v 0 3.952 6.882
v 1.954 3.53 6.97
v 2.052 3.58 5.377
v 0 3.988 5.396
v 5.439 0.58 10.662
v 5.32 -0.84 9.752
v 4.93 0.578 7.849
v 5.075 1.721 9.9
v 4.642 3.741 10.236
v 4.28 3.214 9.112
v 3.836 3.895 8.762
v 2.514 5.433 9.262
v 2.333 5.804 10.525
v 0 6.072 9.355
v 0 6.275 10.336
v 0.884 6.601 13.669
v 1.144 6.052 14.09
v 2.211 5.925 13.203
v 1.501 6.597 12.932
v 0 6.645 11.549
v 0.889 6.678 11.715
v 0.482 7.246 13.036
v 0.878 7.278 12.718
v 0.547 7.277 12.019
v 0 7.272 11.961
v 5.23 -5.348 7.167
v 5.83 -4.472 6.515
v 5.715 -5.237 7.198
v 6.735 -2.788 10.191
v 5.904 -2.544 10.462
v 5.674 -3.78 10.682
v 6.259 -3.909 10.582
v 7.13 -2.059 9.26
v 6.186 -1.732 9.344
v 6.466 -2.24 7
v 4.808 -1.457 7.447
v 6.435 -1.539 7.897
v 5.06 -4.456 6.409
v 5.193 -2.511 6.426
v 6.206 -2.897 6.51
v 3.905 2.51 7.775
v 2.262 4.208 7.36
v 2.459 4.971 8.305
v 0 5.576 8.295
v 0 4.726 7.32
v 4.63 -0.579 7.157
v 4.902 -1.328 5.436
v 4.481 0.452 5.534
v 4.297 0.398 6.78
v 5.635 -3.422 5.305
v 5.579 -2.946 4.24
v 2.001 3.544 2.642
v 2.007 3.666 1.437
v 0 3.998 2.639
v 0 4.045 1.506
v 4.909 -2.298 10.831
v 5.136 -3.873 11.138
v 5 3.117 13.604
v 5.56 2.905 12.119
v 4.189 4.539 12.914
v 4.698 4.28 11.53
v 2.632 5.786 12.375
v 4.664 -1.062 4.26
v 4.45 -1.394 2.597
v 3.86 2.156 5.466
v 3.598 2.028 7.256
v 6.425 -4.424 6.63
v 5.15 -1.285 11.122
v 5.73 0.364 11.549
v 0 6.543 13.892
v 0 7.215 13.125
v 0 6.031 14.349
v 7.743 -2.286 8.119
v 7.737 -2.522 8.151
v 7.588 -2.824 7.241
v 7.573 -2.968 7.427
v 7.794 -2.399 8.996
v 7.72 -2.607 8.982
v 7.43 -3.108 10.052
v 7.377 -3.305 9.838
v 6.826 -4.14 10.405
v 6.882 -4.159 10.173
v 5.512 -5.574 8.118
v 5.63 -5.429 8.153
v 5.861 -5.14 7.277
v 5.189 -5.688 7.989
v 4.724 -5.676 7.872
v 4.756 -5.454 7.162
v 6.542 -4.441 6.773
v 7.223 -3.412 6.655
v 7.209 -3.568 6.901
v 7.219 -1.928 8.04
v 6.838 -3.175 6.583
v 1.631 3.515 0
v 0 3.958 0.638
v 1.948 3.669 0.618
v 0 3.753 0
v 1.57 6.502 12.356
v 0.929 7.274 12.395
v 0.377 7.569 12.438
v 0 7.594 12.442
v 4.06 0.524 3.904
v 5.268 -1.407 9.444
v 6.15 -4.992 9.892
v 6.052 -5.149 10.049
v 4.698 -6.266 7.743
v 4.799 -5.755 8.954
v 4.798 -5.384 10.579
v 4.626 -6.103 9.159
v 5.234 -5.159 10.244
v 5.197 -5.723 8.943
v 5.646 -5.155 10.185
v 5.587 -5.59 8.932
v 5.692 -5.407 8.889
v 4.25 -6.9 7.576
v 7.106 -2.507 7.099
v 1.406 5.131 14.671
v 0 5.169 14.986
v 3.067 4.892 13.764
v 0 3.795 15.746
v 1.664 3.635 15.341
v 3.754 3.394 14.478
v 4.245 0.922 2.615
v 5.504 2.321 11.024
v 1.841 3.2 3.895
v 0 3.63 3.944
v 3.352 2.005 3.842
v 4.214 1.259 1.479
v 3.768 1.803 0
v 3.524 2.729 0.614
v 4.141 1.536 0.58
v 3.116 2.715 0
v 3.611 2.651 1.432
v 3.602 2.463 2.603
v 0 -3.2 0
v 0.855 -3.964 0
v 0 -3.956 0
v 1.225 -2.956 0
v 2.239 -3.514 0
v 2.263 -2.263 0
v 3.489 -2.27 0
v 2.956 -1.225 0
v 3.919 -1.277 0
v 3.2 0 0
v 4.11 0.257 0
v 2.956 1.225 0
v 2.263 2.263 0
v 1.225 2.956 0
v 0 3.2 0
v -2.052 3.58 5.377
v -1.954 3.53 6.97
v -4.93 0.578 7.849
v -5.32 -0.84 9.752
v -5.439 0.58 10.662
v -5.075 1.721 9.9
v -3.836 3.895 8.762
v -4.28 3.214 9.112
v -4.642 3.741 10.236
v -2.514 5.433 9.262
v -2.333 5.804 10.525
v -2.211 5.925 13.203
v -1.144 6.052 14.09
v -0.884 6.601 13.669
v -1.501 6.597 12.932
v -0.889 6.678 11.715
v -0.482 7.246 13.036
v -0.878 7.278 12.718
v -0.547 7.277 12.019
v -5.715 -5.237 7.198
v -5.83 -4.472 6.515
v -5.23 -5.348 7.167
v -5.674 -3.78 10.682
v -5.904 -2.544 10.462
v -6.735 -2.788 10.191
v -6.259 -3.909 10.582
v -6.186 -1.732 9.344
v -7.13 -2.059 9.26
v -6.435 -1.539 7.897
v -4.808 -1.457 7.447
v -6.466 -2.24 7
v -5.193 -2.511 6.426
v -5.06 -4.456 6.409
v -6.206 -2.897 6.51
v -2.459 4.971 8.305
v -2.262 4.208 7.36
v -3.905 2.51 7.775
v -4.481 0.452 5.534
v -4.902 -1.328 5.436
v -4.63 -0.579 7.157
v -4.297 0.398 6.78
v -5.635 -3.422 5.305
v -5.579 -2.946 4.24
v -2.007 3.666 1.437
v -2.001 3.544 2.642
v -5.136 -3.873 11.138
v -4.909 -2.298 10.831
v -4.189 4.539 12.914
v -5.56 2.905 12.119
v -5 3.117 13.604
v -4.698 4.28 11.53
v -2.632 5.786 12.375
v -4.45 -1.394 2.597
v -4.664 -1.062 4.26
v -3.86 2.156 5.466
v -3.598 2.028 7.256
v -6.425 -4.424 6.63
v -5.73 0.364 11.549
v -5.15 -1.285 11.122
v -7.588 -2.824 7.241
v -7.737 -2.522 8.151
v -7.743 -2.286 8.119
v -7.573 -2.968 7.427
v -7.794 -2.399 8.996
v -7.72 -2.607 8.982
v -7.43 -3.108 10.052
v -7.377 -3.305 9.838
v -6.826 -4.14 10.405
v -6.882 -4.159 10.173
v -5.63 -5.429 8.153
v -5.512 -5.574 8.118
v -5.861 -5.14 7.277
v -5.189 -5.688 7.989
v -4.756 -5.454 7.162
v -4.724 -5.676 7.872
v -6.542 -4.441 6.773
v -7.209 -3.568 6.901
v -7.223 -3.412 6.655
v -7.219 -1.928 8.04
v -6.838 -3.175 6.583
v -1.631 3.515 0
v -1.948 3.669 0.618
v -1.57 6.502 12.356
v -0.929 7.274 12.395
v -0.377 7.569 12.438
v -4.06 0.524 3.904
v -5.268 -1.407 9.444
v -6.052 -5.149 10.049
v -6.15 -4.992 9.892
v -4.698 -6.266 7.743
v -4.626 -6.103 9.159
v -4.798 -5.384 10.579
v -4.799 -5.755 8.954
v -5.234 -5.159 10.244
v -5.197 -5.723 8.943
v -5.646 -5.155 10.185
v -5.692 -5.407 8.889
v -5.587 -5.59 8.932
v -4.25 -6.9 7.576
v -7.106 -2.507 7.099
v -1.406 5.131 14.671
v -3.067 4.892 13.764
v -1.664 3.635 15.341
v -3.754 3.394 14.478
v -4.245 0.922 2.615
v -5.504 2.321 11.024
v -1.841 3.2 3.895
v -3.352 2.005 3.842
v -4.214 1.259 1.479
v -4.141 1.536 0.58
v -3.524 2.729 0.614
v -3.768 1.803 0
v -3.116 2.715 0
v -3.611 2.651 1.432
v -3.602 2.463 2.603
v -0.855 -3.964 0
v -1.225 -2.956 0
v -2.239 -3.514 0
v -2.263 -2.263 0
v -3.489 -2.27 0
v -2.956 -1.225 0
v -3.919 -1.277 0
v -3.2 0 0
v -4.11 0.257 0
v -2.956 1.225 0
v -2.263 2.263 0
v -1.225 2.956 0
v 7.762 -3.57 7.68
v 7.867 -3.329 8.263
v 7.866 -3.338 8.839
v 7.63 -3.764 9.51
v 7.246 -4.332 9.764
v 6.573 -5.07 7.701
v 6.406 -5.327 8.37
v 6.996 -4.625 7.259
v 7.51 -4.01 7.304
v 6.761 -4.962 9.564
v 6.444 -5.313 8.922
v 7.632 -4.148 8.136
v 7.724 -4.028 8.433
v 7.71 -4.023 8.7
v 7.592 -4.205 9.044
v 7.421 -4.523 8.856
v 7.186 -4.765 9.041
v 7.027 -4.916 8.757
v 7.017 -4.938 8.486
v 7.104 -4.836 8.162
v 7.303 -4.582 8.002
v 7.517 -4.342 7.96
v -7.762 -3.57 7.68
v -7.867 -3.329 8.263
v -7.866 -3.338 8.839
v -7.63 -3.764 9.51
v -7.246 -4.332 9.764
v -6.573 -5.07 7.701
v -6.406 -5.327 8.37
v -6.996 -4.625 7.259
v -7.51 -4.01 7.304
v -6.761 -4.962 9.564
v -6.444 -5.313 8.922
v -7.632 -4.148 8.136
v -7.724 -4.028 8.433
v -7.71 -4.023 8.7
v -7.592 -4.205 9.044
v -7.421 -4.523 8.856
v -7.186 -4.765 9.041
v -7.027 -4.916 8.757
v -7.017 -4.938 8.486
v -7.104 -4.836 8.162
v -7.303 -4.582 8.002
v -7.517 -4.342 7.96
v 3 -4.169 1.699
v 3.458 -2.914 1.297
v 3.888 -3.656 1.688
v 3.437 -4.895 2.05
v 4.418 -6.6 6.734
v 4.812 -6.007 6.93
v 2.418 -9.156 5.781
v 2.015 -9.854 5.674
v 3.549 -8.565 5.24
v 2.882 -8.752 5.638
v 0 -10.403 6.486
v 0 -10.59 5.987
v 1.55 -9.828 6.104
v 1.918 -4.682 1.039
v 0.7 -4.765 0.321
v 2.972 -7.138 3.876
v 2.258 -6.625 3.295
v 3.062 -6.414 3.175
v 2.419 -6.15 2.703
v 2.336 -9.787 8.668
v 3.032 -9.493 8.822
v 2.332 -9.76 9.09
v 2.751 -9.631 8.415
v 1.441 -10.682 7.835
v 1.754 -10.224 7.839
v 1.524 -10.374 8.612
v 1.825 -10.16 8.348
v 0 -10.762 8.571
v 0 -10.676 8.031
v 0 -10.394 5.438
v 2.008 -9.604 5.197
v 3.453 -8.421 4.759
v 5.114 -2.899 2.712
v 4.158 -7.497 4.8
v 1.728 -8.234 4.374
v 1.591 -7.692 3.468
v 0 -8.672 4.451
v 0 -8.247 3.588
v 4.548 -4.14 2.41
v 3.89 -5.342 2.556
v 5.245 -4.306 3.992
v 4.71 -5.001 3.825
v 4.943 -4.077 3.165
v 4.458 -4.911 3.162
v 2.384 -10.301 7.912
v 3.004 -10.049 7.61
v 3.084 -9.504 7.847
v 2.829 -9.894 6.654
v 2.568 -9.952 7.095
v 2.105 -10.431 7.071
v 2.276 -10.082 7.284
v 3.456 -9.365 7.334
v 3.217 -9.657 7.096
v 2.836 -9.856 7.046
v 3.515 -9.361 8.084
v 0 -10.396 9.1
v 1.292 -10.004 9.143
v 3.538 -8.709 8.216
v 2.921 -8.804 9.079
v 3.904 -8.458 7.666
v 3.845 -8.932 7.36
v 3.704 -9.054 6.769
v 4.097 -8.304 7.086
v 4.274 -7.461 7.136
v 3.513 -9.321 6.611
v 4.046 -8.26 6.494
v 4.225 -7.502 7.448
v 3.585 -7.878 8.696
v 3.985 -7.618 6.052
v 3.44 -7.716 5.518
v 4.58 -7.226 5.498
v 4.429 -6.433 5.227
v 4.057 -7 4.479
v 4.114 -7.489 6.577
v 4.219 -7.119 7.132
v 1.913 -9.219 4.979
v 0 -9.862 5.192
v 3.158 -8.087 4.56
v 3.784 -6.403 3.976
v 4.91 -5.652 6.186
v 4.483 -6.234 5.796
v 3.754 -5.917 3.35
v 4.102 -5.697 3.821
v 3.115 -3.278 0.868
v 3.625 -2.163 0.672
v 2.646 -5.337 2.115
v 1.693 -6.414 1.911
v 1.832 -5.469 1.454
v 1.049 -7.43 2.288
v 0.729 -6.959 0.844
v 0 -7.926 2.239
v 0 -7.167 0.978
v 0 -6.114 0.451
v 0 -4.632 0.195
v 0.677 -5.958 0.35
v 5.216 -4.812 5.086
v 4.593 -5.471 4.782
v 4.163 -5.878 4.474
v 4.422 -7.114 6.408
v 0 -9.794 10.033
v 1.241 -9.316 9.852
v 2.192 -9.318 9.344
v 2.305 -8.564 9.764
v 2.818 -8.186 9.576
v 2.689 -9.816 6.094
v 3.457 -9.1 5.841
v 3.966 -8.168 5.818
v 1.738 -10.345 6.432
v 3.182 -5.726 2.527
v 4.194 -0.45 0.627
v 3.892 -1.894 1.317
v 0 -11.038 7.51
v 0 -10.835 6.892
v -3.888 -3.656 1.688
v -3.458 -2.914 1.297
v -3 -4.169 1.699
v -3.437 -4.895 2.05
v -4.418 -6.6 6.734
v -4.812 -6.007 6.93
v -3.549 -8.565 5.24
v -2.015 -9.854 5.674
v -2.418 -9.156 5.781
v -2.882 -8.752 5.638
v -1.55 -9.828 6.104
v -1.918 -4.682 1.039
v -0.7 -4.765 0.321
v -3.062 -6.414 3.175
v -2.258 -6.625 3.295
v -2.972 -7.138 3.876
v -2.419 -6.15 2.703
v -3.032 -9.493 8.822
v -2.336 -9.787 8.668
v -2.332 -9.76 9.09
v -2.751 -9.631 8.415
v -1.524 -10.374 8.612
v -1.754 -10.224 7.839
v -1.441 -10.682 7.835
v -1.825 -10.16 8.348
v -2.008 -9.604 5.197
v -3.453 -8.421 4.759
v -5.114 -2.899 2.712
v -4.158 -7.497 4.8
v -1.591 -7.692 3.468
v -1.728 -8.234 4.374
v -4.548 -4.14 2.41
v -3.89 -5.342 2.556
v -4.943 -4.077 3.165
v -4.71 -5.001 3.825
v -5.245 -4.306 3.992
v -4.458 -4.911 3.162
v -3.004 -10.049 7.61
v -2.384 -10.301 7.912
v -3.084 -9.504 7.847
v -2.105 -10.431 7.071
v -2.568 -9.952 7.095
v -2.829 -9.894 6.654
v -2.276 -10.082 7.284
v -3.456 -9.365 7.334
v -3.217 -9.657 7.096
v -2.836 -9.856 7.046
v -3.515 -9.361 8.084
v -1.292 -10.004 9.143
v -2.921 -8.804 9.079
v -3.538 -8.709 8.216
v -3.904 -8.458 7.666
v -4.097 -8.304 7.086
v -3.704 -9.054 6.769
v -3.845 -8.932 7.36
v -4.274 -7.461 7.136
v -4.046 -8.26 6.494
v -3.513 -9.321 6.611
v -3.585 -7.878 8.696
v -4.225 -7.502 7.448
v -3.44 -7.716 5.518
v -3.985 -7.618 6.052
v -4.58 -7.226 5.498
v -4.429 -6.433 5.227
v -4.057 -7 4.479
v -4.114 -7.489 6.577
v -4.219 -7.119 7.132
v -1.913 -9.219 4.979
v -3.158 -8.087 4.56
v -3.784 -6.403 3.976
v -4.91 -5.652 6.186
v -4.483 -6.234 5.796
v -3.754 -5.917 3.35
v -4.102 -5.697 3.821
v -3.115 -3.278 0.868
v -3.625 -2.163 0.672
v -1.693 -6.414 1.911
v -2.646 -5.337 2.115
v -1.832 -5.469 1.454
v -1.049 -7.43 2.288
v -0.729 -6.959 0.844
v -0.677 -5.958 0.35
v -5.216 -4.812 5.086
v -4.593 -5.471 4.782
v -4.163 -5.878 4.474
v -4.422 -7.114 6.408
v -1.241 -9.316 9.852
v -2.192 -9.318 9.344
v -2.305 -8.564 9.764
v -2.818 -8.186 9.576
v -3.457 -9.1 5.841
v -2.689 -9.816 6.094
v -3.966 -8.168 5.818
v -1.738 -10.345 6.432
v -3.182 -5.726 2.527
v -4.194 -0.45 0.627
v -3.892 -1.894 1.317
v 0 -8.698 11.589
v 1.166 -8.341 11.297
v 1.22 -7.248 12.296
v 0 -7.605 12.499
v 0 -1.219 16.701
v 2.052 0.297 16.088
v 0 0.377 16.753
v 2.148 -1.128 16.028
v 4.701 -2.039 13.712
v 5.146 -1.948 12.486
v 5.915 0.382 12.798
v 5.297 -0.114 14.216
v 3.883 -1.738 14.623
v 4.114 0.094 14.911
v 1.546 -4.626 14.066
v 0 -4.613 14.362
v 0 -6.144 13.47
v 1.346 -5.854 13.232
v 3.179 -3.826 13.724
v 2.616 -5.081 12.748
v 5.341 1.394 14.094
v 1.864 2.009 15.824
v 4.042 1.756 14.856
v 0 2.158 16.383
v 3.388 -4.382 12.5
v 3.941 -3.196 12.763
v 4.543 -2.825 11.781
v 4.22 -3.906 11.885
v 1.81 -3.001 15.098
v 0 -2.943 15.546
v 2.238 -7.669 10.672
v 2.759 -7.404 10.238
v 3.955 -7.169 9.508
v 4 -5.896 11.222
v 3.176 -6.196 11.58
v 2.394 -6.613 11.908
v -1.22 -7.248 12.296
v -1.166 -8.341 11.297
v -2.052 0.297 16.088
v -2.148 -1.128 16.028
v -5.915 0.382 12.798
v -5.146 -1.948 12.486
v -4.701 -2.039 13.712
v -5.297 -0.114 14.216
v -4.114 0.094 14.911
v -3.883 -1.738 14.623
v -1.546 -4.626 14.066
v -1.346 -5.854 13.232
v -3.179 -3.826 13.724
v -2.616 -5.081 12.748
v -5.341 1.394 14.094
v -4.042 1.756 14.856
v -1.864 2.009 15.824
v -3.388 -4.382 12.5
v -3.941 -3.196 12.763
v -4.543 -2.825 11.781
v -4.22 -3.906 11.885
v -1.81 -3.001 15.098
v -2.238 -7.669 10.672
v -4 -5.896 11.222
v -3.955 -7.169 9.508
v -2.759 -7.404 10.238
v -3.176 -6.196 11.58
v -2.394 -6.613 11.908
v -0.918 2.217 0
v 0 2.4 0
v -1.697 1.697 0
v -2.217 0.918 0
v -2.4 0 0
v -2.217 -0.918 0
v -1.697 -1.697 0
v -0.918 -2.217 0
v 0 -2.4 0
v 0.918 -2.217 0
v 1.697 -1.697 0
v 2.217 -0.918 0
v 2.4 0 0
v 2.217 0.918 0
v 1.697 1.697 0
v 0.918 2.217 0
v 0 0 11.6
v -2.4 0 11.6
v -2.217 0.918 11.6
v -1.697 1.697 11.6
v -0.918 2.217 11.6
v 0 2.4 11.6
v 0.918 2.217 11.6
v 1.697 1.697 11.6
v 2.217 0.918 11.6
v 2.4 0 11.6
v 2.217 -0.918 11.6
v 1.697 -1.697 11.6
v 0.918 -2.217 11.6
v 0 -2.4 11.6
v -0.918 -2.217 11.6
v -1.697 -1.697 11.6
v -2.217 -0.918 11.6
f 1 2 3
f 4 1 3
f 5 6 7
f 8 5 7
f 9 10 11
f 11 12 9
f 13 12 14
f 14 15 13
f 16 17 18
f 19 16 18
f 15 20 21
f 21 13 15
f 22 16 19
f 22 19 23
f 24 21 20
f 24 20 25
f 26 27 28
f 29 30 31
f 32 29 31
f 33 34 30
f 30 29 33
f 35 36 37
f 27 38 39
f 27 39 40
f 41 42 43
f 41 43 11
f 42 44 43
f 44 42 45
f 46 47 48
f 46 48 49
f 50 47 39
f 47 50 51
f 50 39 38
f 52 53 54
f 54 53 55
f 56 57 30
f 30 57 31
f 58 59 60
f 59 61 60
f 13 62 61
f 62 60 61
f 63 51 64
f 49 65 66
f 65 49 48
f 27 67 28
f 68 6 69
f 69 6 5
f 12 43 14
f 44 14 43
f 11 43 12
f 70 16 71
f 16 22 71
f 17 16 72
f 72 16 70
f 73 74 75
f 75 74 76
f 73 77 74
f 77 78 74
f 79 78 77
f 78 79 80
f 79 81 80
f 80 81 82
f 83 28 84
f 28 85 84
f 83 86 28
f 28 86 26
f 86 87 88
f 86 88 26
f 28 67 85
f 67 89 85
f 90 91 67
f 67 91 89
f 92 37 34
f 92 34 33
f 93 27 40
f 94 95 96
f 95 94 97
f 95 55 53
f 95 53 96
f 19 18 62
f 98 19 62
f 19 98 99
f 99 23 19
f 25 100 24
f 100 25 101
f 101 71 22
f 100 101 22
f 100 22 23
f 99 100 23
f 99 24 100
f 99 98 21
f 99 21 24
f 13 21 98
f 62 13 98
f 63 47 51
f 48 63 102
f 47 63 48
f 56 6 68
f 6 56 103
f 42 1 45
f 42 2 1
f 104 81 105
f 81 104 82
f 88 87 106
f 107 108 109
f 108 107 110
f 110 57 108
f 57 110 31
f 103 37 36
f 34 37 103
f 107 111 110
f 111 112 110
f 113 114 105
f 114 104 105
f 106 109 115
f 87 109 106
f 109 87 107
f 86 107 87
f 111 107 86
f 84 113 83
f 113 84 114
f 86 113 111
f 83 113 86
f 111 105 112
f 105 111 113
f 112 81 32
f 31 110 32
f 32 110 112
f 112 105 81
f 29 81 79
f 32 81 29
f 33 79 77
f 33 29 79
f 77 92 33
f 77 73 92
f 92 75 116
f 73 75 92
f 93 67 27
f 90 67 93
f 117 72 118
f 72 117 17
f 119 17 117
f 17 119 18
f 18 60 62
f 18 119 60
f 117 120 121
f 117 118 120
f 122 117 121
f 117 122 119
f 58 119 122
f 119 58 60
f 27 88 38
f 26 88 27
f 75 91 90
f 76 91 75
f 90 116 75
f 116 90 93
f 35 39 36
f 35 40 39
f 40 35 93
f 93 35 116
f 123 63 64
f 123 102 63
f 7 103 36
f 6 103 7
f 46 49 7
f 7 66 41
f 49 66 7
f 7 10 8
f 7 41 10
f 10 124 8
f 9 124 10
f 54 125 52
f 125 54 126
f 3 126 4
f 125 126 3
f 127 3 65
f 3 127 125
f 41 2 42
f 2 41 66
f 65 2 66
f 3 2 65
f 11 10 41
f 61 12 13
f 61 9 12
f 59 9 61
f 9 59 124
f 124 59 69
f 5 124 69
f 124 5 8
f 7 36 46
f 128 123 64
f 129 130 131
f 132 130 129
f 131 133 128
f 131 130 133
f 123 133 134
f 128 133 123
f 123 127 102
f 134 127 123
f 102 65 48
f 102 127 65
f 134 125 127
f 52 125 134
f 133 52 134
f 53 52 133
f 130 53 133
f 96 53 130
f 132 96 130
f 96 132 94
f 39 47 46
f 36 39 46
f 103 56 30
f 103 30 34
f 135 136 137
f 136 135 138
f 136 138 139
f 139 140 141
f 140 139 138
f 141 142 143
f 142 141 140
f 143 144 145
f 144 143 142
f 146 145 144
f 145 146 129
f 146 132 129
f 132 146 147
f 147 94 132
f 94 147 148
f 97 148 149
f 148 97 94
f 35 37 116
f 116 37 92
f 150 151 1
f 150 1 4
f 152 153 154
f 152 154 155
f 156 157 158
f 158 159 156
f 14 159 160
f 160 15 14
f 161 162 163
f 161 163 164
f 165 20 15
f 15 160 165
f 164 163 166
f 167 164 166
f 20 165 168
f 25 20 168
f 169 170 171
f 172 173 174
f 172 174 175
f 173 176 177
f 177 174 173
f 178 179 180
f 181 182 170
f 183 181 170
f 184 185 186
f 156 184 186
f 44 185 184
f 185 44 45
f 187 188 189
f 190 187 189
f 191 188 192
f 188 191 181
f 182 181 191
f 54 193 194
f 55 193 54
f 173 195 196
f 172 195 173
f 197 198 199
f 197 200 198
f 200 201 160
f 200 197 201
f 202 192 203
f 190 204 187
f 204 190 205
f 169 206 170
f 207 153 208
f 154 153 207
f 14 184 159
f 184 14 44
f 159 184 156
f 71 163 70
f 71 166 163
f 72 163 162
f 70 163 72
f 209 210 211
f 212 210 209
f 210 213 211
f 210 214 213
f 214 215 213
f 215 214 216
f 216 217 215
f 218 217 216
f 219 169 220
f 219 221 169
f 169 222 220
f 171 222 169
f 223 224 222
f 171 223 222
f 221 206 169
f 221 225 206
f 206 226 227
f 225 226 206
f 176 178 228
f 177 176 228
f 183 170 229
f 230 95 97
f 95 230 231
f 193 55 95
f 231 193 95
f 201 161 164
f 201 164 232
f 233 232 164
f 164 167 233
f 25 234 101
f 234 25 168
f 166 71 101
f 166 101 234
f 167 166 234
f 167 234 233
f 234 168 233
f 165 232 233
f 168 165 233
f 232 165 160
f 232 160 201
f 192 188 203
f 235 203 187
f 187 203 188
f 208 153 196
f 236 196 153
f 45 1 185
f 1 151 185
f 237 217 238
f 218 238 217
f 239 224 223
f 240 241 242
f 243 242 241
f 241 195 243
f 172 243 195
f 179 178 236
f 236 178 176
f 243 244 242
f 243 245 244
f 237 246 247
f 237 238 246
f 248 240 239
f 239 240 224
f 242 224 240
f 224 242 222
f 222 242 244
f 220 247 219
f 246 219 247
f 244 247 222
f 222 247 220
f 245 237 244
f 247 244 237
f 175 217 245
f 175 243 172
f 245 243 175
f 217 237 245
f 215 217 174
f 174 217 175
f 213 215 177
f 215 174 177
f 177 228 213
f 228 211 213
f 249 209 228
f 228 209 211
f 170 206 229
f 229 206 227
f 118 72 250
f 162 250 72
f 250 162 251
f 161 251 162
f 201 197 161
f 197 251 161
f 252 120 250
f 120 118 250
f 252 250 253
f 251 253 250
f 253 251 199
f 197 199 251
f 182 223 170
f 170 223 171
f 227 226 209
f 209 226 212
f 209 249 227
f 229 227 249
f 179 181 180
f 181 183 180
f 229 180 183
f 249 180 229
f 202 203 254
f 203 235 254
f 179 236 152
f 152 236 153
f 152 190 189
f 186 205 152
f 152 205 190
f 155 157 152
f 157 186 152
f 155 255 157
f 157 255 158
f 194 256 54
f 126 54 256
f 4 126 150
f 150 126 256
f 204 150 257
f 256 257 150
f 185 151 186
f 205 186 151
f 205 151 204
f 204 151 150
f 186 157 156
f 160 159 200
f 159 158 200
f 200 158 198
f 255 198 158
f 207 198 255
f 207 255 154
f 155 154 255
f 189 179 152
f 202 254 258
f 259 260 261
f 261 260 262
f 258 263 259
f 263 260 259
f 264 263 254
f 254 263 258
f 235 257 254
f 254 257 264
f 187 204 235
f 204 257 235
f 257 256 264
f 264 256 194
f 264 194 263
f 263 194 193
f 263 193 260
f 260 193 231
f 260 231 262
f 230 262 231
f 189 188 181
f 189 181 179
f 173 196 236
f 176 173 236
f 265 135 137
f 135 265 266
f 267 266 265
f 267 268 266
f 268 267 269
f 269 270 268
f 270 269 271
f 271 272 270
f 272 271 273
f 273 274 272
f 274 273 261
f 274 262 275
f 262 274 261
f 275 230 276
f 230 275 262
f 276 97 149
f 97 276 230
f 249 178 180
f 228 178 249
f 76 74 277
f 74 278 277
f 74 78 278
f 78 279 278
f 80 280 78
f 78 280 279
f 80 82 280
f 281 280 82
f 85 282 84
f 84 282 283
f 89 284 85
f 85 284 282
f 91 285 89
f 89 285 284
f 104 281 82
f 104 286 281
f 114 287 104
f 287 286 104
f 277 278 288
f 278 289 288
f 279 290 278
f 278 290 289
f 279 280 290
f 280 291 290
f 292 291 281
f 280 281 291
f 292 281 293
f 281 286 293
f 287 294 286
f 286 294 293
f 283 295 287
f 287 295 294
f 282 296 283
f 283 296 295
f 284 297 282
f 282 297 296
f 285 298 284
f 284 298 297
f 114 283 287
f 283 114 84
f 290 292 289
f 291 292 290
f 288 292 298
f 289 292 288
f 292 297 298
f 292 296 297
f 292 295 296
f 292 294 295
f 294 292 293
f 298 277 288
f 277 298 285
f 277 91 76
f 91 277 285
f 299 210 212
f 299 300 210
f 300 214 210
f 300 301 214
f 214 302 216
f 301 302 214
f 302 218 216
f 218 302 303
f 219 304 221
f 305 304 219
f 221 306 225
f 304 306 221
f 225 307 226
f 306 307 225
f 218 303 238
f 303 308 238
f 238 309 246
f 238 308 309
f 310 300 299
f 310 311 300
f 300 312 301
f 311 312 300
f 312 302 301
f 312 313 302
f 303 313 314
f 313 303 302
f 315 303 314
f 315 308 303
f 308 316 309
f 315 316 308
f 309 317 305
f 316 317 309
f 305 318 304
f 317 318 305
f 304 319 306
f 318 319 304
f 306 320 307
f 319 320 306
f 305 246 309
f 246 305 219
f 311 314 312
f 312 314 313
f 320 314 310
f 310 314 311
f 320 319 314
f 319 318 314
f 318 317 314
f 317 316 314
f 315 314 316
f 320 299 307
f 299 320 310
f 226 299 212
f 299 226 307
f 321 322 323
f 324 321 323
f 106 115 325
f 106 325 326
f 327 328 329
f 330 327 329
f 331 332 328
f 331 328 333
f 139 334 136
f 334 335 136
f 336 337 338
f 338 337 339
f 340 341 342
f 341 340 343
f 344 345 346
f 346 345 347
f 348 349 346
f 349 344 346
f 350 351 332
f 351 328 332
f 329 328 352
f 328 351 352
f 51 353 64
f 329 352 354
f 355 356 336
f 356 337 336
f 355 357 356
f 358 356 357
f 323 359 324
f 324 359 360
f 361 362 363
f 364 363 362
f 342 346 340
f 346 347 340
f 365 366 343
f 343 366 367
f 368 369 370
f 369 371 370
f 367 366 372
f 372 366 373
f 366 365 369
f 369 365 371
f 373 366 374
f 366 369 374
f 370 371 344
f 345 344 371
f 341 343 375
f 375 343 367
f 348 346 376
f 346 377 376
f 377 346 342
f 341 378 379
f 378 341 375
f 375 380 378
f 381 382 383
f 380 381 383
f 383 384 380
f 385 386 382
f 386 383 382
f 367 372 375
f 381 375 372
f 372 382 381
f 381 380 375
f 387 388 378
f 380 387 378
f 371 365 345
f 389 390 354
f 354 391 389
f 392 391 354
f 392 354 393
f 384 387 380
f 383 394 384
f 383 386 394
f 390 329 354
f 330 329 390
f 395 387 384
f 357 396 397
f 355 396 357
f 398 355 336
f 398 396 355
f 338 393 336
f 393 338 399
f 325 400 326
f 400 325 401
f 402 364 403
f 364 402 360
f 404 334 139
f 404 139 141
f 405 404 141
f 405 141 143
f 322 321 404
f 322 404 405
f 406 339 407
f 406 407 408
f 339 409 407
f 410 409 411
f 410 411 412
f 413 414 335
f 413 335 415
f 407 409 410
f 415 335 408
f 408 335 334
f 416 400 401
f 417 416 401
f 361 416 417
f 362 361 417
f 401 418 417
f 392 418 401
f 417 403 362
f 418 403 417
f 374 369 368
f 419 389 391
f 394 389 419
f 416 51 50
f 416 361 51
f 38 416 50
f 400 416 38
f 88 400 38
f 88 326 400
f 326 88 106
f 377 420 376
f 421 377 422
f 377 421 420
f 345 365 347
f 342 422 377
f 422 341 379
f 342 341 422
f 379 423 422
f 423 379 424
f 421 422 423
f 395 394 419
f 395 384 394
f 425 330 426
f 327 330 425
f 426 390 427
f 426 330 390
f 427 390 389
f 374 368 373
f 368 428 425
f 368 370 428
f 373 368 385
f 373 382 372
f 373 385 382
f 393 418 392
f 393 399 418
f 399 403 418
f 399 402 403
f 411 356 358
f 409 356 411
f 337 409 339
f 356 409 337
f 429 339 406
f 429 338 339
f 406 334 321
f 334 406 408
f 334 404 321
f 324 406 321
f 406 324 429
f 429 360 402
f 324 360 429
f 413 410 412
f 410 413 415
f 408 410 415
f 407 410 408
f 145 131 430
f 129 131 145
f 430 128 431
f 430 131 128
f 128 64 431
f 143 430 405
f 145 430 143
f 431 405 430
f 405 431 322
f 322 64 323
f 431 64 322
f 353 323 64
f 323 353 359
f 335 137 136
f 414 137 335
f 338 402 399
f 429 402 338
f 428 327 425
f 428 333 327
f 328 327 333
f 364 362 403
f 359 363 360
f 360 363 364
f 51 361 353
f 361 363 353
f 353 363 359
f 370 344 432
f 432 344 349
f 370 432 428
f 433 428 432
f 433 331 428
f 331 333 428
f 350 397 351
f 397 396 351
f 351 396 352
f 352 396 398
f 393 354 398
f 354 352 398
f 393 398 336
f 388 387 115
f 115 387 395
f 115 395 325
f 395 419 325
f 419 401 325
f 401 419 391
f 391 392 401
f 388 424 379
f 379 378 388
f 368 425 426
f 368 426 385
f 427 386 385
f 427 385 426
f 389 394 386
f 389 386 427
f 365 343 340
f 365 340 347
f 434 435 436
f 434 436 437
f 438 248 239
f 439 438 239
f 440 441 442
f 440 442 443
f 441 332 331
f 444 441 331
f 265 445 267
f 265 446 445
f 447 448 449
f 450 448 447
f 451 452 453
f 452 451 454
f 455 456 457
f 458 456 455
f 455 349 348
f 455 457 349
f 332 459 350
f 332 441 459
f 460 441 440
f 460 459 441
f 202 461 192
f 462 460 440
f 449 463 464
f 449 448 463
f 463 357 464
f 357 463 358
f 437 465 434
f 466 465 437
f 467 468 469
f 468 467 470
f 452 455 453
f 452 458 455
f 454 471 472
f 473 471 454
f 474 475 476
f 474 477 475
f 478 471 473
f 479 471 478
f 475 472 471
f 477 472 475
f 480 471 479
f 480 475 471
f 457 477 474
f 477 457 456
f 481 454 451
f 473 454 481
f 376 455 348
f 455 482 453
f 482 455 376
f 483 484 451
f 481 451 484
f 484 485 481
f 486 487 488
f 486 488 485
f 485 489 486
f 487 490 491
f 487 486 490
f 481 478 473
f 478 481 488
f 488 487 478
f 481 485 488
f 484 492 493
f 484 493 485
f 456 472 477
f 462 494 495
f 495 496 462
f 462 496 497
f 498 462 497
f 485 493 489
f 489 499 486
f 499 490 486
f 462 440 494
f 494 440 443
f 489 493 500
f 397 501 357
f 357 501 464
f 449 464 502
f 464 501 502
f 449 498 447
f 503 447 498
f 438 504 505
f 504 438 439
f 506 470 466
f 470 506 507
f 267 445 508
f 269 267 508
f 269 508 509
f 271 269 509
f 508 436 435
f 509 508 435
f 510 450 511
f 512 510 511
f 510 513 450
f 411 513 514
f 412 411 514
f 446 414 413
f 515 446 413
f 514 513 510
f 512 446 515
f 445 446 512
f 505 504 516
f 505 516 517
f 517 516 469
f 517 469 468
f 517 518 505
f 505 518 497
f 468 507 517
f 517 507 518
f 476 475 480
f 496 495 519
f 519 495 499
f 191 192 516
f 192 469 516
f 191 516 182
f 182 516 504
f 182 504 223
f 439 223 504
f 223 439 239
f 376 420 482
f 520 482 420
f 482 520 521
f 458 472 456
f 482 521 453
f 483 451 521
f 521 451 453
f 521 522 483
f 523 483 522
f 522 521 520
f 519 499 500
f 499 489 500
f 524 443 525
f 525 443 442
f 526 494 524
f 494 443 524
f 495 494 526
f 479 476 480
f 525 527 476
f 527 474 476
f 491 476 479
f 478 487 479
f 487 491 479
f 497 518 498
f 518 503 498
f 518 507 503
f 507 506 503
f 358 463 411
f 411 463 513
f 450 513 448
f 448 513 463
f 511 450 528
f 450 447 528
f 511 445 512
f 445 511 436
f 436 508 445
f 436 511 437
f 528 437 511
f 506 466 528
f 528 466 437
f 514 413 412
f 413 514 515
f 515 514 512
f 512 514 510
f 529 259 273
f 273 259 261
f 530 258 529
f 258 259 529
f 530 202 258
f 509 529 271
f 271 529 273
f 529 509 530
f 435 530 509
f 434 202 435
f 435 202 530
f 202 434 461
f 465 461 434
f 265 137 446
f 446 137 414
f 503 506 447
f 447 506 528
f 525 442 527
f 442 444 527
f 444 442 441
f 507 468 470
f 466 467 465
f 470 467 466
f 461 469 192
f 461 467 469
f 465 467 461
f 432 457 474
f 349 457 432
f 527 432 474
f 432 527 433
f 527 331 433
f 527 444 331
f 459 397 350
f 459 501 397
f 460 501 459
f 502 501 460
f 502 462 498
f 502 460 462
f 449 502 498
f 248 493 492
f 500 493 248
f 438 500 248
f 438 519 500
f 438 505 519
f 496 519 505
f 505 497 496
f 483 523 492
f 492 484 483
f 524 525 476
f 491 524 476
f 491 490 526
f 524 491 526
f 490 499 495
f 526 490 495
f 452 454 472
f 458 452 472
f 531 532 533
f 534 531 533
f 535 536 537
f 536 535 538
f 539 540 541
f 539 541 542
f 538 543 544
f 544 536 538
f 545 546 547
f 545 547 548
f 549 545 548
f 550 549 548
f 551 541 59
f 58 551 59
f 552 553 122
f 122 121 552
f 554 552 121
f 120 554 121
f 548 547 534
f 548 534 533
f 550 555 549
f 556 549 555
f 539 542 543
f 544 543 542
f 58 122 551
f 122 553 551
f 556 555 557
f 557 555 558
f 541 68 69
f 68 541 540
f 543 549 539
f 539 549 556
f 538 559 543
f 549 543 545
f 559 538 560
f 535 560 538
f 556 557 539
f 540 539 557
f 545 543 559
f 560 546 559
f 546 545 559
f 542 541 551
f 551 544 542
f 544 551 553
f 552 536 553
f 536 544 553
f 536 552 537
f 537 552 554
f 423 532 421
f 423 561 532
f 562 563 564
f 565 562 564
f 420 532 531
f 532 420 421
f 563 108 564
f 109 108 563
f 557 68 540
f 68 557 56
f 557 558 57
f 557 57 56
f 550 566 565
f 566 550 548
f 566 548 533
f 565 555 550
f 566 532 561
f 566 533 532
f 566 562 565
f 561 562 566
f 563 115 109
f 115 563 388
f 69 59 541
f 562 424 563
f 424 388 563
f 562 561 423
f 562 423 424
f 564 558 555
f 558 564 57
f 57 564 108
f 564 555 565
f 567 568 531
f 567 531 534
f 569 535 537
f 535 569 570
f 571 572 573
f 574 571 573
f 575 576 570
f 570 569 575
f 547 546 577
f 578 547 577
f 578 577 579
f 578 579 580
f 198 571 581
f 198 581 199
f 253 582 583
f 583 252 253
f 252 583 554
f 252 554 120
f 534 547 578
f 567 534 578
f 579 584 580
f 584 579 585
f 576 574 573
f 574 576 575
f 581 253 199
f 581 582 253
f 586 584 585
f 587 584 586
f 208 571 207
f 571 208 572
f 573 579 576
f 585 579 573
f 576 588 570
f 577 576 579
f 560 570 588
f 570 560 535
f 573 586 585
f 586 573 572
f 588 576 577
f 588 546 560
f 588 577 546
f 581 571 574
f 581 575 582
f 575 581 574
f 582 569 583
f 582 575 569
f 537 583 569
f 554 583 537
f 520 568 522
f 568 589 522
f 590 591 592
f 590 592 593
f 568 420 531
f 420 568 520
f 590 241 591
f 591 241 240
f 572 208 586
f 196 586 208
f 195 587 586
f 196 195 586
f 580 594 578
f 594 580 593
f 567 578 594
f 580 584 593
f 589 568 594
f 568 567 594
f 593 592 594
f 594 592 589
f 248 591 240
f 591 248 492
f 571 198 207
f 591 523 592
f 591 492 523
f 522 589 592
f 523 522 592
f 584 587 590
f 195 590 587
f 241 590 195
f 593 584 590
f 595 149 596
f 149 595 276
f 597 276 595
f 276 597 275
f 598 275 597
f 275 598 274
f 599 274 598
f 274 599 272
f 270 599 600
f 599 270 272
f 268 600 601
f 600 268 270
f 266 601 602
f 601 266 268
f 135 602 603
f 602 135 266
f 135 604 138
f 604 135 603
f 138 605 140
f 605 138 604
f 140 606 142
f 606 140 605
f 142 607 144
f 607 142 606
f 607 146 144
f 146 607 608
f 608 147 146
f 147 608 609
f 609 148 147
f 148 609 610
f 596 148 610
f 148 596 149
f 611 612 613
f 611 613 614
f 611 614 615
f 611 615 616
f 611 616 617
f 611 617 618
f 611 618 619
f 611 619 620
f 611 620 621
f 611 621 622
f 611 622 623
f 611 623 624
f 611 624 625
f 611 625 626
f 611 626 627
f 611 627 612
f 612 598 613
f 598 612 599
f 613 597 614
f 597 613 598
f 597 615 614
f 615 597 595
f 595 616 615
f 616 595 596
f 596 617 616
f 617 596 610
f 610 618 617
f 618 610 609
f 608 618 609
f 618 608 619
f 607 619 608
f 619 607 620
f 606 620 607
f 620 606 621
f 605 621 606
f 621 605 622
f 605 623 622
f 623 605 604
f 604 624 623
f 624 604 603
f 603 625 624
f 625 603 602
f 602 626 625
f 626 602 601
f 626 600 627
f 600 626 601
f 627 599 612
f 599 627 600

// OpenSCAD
use <../lib.scad>
use <s/64808s01.scad>
use <s/64808s02.scad>
use <s/64808s03.scad>
use <s/64808s04.scad>
use <../p/stud4o.scad>
function ldraw_lib__64808() = [
// 0 Minifig Head Mon Calamari
// 0 Name: 64808.dat
// 0 Author: Stan Isachenko [angmarec]
// 0 !LDRAW_ORG Part UPDATE 2022-01
// 0 !LICENSE Licensed under CC BY 2.0 and CC BY 4.0 : see CAreadme.txt
// 
// 0 BFC CERTIFY CCW
  [0,"BFC","CERTIFY"],
  [0,"BFC","CCW"],
// 
// 0 !KEYWORDS Nahdar Vebb, Star Wars
// 
// 0 !HISTORY 2011-10-27 {LEGO Digital Designer} Original part shape
// 0 !HISTORY 2011-10-28 [angmarec] File preparation for LDraw Parts Tracker
// 0 !HISTORY 2019-10-04 [GeraldLasser] Subfiled for Patterns
// 0 !HISTORY 2020-03-28 [Holly-Wood] Fixed conds, smoothed surface, used stud prim
// 0 !HISTORY 2022-01-14 [PTadmin] Official Update 2022-01
// 
// 
// 1 16 0 0 0 1 0 0 0 1 0 0 0 1 s\64808s01.dat
  [1,16,0,0,0,1,0,0,0,1,0,0,0,1, ldraw_lib__s__64808s01()],
// 1 16 0 0 0 -1 0 0 0 1 0 0 0 1 s\64808s01.dat
  [1,16,0,0,0,-1,0,0,0,1,0,0,0,1, ldraw_lib__s__64808s01()],
// 1 16 0 0 0 1 0 0 0 1 0 0 0 1 s\64808s02.dat
  [1,16,0,0,0,1,0,0,0,1,0,0,0,1, ldraw_lib__s__64808s02()],
// 1 16 0 0 0 -1 0 0 0 1 0 0 0 1 s\64808s02.dat
  [1,16,0,0,0,-1,0,0,0,1,0,0,0,1, ldraw_lib__s__64808s02()],
// 1 16 0 0 0 1 0 0 0 1 0 0 0 1 s\64808s03.dat
  [1,16,0,0,0,1,0,0,0,1,0,0,0,1, ldraw_lib__s__64808s03()],
// 1 16 0 0 0 -1 0 0 0 1 0 0 0 1 s\64808s03.dat
  [1,16,0,0,0,-1,0,0,0,1,0,0,0,1, ldraw_lib__s__64808s03()],
// 1 16 0 0 0 1 0 0 0 1 0 0 0 1 s\64808s04.dat
  [1,16,0,0,0,1,0,0,0,1,0,0,0,1, ldraw_lib__s__64808s04()],
// 1 16 0 0 0 -1 0 0 0 1 0 0 0 1 s\64808s04.dat
  [1,16,0,0,0,-1,0,0,0,1,0,0,0,1, ldraw_lib__s__64808s04()],
// 1 16 0 -29 0 1 0 0 0 -7.25 0 0 0 1 stud4o.dat
  [1,16,0,-29,0,1,0,0,0,-7.25,0,0,0,1, ldraw_lib__stud4o()],
];
makepoly(ldraw_lib__64808(), line=0.2);
